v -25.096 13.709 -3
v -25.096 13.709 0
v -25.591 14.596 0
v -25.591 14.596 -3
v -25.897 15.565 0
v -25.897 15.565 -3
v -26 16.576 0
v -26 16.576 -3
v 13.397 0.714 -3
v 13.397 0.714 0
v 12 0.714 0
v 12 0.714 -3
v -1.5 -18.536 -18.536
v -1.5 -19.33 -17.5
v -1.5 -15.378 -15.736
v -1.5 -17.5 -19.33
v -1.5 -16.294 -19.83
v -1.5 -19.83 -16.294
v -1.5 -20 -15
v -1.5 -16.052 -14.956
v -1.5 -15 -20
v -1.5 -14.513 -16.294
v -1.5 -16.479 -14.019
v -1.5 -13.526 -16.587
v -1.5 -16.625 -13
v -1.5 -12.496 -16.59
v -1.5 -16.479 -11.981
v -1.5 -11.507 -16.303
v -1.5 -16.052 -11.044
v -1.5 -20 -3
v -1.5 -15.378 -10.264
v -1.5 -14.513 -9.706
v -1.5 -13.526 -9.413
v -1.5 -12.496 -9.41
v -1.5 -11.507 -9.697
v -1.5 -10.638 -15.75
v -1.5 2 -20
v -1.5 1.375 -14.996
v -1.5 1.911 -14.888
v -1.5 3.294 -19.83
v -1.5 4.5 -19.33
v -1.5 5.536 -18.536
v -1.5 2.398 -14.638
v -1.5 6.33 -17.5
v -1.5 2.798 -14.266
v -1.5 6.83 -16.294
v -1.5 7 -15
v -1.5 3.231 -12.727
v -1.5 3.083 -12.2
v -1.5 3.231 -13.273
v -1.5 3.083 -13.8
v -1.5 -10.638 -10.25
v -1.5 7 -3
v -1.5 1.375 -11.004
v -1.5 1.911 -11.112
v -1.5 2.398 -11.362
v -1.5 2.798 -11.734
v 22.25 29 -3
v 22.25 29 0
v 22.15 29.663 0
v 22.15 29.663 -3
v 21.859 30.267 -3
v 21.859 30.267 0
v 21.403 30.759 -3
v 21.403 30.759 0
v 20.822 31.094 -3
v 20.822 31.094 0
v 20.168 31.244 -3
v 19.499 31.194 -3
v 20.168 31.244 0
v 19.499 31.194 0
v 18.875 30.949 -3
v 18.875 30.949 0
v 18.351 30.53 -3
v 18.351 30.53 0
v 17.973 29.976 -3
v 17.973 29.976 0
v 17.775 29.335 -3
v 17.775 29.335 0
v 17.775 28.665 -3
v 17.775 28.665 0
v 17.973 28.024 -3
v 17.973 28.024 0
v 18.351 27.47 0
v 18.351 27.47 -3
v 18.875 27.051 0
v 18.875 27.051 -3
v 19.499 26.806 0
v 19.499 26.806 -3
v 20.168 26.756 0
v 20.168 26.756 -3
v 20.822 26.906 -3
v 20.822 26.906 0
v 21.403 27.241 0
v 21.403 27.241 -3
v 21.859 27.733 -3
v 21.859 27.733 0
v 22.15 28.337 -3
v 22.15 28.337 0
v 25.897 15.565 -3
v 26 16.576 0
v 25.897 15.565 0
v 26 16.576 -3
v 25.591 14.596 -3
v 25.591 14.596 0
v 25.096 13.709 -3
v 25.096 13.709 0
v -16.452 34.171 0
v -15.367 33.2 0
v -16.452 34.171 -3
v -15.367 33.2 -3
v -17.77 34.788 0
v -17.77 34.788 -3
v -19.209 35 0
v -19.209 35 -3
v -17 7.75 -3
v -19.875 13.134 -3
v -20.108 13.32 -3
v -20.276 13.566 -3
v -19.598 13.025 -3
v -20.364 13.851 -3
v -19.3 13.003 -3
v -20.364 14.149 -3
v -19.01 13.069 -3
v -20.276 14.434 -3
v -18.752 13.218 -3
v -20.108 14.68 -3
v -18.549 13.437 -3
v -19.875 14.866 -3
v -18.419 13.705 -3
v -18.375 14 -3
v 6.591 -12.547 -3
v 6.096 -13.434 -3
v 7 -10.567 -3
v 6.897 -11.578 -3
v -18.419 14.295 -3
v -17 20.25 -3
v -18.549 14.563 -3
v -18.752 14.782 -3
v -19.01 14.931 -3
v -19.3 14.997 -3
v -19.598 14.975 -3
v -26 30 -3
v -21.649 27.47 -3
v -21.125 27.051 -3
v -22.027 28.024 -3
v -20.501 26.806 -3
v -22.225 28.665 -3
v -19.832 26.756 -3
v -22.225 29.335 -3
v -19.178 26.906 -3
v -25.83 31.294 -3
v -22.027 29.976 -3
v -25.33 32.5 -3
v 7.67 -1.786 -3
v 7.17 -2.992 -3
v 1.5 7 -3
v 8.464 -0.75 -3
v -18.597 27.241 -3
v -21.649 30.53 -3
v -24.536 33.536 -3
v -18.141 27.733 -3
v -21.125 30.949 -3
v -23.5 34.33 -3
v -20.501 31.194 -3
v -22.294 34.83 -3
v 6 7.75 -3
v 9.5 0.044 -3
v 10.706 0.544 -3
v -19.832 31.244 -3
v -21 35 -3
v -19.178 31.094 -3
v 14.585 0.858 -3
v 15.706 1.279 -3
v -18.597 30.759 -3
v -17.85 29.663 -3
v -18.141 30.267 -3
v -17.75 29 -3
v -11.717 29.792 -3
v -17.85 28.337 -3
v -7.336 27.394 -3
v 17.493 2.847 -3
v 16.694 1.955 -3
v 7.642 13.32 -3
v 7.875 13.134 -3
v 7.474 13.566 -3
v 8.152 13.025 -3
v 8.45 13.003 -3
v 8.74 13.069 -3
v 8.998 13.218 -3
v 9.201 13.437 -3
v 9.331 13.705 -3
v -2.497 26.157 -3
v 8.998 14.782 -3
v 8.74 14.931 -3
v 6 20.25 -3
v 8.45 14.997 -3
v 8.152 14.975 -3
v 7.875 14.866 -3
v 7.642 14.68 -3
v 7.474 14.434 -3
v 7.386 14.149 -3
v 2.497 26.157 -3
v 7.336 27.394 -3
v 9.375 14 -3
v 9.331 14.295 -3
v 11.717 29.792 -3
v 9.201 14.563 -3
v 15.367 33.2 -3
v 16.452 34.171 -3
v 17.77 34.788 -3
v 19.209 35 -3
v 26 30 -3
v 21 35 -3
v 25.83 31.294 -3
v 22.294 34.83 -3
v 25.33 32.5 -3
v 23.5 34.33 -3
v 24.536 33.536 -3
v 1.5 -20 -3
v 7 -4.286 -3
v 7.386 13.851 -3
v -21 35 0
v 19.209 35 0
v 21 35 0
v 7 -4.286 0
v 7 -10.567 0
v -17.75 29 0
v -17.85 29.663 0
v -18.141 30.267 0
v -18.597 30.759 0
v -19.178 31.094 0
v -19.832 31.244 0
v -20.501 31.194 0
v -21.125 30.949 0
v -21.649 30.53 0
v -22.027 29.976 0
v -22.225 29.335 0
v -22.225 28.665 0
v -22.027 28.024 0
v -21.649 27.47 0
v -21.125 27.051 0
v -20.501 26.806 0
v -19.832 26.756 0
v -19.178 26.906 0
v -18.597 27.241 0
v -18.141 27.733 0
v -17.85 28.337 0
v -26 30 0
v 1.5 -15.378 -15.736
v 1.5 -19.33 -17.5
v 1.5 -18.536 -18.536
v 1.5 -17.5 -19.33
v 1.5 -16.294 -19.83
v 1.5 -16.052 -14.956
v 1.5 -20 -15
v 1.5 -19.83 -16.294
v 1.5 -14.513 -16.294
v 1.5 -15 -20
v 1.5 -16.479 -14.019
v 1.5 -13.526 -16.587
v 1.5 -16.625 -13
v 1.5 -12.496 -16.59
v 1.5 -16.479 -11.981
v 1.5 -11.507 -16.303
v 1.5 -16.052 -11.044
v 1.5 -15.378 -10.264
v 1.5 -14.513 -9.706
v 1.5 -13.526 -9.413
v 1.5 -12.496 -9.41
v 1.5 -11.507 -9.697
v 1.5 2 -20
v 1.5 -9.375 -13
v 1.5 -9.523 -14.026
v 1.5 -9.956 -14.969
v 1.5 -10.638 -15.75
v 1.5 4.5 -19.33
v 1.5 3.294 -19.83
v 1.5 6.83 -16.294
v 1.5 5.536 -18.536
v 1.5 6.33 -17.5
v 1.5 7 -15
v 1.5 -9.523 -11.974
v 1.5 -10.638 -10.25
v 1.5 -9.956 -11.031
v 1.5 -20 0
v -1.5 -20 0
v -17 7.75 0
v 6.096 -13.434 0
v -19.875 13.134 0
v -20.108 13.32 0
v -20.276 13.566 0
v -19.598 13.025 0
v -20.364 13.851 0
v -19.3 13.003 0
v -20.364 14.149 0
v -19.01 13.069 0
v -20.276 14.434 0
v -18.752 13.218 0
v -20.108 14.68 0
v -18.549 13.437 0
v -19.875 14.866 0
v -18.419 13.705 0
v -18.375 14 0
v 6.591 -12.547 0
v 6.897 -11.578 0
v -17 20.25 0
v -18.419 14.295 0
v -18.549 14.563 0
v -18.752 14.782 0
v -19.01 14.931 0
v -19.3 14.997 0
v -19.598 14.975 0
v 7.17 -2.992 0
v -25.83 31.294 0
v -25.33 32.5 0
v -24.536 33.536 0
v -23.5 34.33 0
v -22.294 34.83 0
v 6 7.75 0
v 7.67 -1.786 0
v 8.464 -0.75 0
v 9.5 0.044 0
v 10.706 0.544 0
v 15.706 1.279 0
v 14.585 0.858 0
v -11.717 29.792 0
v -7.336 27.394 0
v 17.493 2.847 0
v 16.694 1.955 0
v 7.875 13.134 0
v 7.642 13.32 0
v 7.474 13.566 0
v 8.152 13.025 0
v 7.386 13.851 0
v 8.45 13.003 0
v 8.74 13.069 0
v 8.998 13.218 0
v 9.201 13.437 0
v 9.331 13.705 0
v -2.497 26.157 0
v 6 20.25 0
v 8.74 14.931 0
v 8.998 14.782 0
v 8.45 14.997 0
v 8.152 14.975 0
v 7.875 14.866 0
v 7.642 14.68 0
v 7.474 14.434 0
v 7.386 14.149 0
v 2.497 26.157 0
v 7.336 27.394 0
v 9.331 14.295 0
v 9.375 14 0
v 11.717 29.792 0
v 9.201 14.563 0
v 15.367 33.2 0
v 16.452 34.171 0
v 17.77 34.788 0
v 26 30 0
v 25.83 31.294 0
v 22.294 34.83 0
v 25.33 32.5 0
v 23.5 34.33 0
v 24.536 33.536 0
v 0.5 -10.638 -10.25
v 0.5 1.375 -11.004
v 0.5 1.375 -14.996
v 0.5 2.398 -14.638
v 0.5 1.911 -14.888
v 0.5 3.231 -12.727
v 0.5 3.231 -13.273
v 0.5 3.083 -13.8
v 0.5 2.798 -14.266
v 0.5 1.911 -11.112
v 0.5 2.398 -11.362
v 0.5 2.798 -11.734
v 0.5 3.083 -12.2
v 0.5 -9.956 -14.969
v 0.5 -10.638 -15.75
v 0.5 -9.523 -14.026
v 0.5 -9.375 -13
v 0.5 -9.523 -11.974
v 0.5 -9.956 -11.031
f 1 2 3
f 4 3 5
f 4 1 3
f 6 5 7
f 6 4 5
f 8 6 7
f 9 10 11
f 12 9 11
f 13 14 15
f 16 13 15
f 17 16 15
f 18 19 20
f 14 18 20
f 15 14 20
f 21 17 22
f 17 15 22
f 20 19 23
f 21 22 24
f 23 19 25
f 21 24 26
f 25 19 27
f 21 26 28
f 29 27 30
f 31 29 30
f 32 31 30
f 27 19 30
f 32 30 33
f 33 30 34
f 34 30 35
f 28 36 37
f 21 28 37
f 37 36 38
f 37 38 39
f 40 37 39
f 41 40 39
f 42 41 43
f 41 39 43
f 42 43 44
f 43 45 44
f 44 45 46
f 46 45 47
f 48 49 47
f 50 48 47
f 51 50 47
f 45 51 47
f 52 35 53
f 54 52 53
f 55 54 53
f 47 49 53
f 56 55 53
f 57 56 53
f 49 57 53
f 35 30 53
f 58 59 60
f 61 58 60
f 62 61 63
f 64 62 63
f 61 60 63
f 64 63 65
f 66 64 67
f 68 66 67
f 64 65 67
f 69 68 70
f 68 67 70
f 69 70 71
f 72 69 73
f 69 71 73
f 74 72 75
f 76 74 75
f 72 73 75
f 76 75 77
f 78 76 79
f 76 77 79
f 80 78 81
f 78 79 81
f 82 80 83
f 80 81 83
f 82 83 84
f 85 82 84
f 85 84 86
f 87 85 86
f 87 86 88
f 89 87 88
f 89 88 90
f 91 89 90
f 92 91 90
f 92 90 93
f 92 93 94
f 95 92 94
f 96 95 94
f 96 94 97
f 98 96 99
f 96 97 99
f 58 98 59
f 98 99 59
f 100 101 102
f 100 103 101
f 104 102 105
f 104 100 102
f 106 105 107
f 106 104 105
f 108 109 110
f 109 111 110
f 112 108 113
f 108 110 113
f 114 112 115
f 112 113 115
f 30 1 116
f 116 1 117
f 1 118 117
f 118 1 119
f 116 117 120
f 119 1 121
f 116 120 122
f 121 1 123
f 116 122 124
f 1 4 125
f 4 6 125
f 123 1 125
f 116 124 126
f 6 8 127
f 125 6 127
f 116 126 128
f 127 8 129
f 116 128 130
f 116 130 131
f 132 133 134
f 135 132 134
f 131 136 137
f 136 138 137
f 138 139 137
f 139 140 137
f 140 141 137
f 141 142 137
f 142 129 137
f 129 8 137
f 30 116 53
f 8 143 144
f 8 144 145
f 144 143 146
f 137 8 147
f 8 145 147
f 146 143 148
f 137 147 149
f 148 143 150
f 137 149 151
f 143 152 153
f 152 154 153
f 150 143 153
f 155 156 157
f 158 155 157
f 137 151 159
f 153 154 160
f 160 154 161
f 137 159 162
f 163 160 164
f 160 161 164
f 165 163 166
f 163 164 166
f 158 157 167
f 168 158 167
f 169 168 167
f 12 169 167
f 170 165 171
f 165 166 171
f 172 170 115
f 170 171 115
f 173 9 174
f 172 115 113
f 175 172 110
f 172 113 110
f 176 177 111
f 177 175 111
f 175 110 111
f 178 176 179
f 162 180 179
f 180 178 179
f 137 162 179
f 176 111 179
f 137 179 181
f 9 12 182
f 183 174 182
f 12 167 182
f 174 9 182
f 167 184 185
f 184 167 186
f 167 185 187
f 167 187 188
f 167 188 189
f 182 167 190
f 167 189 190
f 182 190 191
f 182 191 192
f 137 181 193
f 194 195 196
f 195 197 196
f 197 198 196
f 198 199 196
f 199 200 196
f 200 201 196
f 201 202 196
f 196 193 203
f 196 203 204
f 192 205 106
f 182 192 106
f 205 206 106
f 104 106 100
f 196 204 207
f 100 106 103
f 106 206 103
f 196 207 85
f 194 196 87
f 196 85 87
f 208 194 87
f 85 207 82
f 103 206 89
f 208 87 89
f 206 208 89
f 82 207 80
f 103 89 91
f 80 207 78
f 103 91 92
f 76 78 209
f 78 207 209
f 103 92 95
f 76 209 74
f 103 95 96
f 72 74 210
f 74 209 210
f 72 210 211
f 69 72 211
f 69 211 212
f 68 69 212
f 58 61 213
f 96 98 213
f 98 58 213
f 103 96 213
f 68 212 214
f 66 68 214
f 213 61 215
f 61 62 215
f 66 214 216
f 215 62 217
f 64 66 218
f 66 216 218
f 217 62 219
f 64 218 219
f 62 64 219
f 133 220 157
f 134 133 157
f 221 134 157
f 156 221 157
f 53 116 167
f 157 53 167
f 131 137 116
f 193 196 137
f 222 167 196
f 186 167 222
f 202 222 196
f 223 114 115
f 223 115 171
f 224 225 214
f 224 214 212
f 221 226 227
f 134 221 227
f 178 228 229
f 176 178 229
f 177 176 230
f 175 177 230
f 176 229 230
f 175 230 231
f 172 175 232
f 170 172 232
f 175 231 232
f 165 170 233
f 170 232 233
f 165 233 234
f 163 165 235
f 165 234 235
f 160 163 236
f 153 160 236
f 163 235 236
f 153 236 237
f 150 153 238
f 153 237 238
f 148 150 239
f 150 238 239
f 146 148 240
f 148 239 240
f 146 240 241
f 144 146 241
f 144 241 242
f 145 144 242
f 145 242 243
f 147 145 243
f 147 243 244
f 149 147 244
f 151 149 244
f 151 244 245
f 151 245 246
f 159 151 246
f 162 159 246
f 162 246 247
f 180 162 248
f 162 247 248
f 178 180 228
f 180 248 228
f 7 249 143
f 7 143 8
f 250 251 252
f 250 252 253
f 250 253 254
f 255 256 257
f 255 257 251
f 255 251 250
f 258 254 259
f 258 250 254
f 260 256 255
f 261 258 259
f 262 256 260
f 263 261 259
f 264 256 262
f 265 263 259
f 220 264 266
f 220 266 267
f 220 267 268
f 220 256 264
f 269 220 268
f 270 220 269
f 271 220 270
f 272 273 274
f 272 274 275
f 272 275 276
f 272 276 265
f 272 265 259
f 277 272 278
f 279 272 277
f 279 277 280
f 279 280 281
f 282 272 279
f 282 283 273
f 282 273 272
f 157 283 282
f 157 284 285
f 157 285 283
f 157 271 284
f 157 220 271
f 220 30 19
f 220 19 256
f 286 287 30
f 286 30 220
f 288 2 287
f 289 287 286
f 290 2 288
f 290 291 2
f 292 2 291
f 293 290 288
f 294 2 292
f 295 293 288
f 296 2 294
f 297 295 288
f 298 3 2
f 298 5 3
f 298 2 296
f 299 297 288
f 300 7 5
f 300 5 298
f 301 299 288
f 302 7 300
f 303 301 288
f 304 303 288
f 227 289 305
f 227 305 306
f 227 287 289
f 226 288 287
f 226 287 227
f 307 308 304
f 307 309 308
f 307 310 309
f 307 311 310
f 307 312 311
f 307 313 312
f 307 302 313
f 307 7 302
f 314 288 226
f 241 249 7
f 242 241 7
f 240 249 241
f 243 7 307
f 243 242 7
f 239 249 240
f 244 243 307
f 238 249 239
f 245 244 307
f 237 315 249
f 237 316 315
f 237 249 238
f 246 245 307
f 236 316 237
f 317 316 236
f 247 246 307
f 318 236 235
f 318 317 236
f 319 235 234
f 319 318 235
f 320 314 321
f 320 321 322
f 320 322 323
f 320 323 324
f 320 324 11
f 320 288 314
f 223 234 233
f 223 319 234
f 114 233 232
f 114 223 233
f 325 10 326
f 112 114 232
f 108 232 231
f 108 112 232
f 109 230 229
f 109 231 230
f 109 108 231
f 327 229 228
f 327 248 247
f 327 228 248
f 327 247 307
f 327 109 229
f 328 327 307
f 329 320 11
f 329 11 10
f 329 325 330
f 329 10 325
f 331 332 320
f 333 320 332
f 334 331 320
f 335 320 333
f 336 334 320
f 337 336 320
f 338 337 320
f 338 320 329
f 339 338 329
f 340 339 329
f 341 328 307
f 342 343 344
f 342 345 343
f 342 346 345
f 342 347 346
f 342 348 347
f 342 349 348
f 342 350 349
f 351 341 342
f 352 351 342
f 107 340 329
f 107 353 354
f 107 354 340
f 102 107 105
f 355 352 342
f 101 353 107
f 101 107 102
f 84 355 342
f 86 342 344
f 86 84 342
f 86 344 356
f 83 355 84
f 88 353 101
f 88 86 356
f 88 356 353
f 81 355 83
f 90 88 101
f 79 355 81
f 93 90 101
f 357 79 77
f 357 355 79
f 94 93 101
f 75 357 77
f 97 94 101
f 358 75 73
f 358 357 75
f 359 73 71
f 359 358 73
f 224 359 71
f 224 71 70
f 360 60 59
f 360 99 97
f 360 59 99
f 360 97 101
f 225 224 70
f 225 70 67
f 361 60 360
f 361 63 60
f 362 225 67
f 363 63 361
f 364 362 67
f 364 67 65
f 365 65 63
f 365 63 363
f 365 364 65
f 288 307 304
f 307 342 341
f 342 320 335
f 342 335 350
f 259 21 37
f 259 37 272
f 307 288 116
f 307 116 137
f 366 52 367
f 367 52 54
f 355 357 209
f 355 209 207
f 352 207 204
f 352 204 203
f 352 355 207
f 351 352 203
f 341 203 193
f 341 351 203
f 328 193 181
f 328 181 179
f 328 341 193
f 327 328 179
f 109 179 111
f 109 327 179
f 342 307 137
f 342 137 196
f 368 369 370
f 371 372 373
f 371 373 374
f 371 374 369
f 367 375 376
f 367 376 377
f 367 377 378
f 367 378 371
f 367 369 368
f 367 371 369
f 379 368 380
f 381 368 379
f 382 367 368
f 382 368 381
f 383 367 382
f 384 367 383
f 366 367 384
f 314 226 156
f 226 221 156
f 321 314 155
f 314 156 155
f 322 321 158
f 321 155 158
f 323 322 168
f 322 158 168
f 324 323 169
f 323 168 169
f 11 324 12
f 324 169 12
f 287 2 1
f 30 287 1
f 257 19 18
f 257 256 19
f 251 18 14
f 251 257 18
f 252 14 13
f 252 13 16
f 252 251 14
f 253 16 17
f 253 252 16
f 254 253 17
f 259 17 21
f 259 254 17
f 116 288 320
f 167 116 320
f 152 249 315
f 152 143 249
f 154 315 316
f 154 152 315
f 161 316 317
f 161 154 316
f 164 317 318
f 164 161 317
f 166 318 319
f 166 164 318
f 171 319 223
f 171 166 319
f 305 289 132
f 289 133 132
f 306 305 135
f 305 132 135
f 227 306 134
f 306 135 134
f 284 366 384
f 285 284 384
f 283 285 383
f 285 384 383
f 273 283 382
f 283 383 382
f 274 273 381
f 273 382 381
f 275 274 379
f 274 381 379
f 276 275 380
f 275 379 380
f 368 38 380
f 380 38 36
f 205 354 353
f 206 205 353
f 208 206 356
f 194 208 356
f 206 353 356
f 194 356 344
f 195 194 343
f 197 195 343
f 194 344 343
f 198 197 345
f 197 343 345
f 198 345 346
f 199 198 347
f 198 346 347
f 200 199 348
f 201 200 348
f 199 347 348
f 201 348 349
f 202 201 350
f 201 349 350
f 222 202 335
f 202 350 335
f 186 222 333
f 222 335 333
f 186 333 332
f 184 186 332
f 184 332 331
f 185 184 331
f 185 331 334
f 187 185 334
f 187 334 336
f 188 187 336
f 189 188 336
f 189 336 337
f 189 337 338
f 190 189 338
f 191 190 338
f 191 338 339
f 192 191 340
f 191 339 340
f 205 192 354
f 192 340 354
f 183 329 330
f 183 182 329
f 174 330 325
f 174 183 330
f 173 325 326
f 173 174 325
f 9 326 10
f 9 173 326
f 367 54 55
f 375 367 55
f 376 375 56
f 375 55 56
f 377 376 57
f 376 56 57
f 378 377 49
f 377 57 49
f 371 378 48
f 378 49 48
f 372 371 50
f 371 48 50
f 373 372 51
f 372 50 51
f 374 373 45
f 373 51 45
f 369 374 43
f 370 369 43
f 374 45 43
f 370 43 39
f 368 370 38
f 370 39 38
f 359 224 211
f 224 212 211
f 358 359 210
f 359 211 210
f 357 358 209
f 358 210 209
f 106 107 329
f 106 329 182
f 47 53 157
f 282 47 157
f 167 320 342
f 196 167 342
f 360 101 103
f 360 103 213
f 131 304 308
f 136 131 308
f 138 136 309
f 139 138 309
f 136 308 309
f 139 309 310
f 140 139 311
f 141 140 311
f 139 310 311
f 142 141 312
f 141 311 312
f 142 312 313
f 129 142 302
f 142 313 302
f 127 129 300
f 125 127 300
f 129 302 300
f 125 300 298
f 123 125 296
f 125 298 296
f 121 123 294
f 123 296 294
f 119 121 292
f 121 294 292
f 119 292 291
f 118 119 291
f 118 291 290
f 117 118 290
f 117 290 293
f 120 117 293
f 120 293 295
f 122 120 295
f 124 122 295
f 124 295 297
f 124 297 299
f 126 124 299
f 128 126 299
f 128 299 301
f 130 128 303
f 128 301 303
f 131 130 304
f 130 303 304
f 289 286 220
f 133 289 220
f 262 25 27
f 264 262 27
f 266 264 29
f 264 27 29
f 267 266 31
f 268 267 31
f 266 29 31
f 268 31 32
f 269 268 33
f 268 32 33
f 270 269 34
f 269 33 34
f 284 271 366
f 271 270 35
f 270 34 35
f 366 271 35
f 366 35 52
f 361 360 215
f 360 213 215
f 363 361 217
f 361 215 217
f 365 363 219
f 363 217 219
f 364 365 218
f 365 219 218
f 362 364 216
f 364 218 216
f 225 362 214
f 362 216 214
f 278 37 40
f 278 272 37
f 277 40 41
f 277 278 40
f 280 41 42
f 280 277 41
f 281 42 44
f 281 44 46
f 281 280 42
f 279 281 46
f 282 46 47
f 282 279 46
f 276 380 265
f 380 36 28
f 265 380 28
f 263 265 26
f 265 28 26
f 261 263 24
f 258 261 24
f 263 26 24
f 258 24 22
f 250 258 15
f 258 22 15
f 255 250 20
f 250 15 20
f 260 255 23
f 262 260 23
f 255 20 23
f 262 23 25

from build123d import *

# Parameters (mm, degrees)
F0_R       = 1
F0_W       = 23
F0_H       = 12.5
F0_R_2     = 2.25
F0_W_2     = 3
F0_H_2     = 27
F1_DEPTH   = 3
F2_DEPTH   = 20
F3_SIZE2   = 24.5
F3_SIZE    = 35
F3_2_SIZE2 = 24.5
F3_2_SIZE  = 35
F4_R       = 5
F6_DEPTH   = 25
F7_DEPTH   = 2
F8_R       = 5
F9_R       = 5
F10_R      = 5
F12_DEPTH  = 25
F13_R      = 5


with BuildPart() as f1:
    # F0 (on Top) → F1 (new body)
    with BuildSketch(Plane.XY):
        with BuildLine():
            Line((-16.7032930885, 35), (-26, 35))
            Line((-26, 35), (-26, -20))
            Line((-26, -20), (-1.5, -20))
            Line((-1.5, -20), (-1.5, 7))
            Line((-1.5, 7), (1.5, 7))
            Line((1.5, 7), (1.5, -20))
            Line((1.5, -20), (26, -20))
            Line((26, -20), (26, 35))
            Line((26, 35), (16.7032930885, 35))
            ThreePointArc((16.7032930885, 35), (0, 26), (-16.7032930885, 35))
        make_face()
        with Locations((-19.375, 14)):
            Circle(F0_R, mode=Mode.SUBTRACT)
        with Locations((-5.5, 14)):
            Rectangle(F0_W, F0_H, mode=Mode.SUBTRACT)
        with Locations((8.375, 14)):
            Circle(F0_R, mode=Mode.SUBTRACT)
        with Locations((-20, 29)):
            Circle(F0_R_2, mode=Mode.SUBTRACT)
        with Locations((20, 29)):
            Circle(F0_R_2, mode=Mode.SUBTRACT)
        with Locations((0, -6.5)):
            Rectangle(F0_W_2, F0_H_2)
    extrude(amount=-F1_DEPTH)

    # F0 (on Top) → F2 (join)
    with BuildSketch(Plane.XY):
        with Locations((0, -6.5)):
            Rectangle(F0_W_2, F0_H_2)
    extrude(amount=-F2_DEPTH)

    # F3
    f3_edges = [f1.edges().sort_by_distance(p)[0] for p in [
        (-26, -20, -1.5),
    ]]
    f3_side = f1.faces().sort_by_distance((-26, 7.5, -1.5))[0]
    chamfer(f3_edges, length=F3_SIZE, length2=F3_SIZE2, reference=f3_side)

    # F3#2
    f3_2_edges = [f1.edges().sort_by_distance(p)[0] for p in [
        (26, -20, -1.5),
    ]]
    f3_2_side = f1.faces().sort_by_distance((26, 7.5, -1.5))[0]
    chamfer(f3_2_edges, length=F3_2_SIZE, length2=F3_2_SIZE2, reference=f3_2_side)

    # F4
    f4_edges = [f1.edges().sort_by_distance(p)[0] for p in [
        (-26, 35, -1.5),
        (26, 35, -1.5),
    ]]
    fillet(f4_edges, radius=F4_R)

    # F5 (on face) → F6 (cut)
    with BuildSketch(Plane(origin=(-1.5, 0, 0), x_dir=(0, -1, 0), z_dir=(-1, 0, 0))):
        with BuildLine():
            ThreePointArc((10.6381945465, -15.75), (14.5131226373, -16.2940984934), (16.625, -13))
            ThreePointArc((16.625, -13), (14.5131226373, -9.7059015066), (10.6381945465, -10.25))
            ThreePointArc((10.6381945465, -10.25), (9.375, -13), (10.6381945465, -15.75))
        make_face()
    extrude(amount=-F6_DEPTH, mode=Mode.SUBTRACT)

    # F5 (on face) → F7 (cut)
    with BuildSketch(Plane(origin=(-1.5, 0, 0), x_dir=(0, -1, 0), z_dir=(-1, 0, 0))):
        with BuildLine():
            ThreePointArc((10.6381945465, -15.75), (9.375, -13), (10.6381945465, -10.25))
            Line((10.6381945465, -10.25), (-1.3752672326, -11.0039268249))
            ThreePointArc((-1.3752672326, -11.0039268249), (0.1192088107, -11.5421703691), (0.75, -13))
            ThreePointArc((0.75, -13), (0.1192088107, -14.4578296309), (-1.3752672326, -14.9960731751))
            Line((-1.3752672326, -14.9960731751), (10.6381945465, -15.75))
        make_face()
        with BuildLine():
            ThreePointArc((0.75, -13), (0.1192088107, -11.5421703691), (-1.3752672326, -11.0039268249))
            ThreePointArc((-1.3752672326, -11.0039268249), (-3.25, -13), (-1.3752672326, -14.9960731751))
            ThreePointArc((-1.3752672326, -14.9960731751), (0.1192088107, -14.4578296309), (0.75, -13))
        make_face()
    extrude(amount=-F7_DEPTH, mode=Mode.SUBTRACT)

    # F8
    f8_edges = [f1.edges().sort_by_distance(p)[0] for p in [
        (-26, 15, -1.5),
        (26, 15, -1.5),
    ]]
    fillet(f8_edges, radius=F8_R)

    # F9
    f9_edges = [f1.edges().sort_by_distance(p)[0] for p in [
        (-16.703293, 35, -1.5),
        (16.703293, 35, -1.5),
    ]]
    fillet(f9_edges, radius=F9_R)

    # F10
    f10_edges = [f1.edges().sort_by_distance(p)[0] for p in [
        (0, -20, -20),
        (0, 7, -20),
    ]]
    fillet(f10_edges, radius=F10_R)

    # F11 (on face) → F12 (cut)
    with BuildSketch(Plane.XY):
        Polygon((7, 0.7142857143), (7, -12.1428571429), (16, 0.7142857143), align=None)
    extrude(amount=-F12_DEPTH, mode=Mode.SUBTRACT)

    # F13
    f13_edges = [f1.edges().sort_by_distance(p)[0] for p in [
        (16, 0.714286, -1.5),
        (7, 0.714286, -1.5),
        (7, -12.142857, -1.5),
    ]]
    fillet(f13_edges, radius=F13_R)


solid = f1.part
